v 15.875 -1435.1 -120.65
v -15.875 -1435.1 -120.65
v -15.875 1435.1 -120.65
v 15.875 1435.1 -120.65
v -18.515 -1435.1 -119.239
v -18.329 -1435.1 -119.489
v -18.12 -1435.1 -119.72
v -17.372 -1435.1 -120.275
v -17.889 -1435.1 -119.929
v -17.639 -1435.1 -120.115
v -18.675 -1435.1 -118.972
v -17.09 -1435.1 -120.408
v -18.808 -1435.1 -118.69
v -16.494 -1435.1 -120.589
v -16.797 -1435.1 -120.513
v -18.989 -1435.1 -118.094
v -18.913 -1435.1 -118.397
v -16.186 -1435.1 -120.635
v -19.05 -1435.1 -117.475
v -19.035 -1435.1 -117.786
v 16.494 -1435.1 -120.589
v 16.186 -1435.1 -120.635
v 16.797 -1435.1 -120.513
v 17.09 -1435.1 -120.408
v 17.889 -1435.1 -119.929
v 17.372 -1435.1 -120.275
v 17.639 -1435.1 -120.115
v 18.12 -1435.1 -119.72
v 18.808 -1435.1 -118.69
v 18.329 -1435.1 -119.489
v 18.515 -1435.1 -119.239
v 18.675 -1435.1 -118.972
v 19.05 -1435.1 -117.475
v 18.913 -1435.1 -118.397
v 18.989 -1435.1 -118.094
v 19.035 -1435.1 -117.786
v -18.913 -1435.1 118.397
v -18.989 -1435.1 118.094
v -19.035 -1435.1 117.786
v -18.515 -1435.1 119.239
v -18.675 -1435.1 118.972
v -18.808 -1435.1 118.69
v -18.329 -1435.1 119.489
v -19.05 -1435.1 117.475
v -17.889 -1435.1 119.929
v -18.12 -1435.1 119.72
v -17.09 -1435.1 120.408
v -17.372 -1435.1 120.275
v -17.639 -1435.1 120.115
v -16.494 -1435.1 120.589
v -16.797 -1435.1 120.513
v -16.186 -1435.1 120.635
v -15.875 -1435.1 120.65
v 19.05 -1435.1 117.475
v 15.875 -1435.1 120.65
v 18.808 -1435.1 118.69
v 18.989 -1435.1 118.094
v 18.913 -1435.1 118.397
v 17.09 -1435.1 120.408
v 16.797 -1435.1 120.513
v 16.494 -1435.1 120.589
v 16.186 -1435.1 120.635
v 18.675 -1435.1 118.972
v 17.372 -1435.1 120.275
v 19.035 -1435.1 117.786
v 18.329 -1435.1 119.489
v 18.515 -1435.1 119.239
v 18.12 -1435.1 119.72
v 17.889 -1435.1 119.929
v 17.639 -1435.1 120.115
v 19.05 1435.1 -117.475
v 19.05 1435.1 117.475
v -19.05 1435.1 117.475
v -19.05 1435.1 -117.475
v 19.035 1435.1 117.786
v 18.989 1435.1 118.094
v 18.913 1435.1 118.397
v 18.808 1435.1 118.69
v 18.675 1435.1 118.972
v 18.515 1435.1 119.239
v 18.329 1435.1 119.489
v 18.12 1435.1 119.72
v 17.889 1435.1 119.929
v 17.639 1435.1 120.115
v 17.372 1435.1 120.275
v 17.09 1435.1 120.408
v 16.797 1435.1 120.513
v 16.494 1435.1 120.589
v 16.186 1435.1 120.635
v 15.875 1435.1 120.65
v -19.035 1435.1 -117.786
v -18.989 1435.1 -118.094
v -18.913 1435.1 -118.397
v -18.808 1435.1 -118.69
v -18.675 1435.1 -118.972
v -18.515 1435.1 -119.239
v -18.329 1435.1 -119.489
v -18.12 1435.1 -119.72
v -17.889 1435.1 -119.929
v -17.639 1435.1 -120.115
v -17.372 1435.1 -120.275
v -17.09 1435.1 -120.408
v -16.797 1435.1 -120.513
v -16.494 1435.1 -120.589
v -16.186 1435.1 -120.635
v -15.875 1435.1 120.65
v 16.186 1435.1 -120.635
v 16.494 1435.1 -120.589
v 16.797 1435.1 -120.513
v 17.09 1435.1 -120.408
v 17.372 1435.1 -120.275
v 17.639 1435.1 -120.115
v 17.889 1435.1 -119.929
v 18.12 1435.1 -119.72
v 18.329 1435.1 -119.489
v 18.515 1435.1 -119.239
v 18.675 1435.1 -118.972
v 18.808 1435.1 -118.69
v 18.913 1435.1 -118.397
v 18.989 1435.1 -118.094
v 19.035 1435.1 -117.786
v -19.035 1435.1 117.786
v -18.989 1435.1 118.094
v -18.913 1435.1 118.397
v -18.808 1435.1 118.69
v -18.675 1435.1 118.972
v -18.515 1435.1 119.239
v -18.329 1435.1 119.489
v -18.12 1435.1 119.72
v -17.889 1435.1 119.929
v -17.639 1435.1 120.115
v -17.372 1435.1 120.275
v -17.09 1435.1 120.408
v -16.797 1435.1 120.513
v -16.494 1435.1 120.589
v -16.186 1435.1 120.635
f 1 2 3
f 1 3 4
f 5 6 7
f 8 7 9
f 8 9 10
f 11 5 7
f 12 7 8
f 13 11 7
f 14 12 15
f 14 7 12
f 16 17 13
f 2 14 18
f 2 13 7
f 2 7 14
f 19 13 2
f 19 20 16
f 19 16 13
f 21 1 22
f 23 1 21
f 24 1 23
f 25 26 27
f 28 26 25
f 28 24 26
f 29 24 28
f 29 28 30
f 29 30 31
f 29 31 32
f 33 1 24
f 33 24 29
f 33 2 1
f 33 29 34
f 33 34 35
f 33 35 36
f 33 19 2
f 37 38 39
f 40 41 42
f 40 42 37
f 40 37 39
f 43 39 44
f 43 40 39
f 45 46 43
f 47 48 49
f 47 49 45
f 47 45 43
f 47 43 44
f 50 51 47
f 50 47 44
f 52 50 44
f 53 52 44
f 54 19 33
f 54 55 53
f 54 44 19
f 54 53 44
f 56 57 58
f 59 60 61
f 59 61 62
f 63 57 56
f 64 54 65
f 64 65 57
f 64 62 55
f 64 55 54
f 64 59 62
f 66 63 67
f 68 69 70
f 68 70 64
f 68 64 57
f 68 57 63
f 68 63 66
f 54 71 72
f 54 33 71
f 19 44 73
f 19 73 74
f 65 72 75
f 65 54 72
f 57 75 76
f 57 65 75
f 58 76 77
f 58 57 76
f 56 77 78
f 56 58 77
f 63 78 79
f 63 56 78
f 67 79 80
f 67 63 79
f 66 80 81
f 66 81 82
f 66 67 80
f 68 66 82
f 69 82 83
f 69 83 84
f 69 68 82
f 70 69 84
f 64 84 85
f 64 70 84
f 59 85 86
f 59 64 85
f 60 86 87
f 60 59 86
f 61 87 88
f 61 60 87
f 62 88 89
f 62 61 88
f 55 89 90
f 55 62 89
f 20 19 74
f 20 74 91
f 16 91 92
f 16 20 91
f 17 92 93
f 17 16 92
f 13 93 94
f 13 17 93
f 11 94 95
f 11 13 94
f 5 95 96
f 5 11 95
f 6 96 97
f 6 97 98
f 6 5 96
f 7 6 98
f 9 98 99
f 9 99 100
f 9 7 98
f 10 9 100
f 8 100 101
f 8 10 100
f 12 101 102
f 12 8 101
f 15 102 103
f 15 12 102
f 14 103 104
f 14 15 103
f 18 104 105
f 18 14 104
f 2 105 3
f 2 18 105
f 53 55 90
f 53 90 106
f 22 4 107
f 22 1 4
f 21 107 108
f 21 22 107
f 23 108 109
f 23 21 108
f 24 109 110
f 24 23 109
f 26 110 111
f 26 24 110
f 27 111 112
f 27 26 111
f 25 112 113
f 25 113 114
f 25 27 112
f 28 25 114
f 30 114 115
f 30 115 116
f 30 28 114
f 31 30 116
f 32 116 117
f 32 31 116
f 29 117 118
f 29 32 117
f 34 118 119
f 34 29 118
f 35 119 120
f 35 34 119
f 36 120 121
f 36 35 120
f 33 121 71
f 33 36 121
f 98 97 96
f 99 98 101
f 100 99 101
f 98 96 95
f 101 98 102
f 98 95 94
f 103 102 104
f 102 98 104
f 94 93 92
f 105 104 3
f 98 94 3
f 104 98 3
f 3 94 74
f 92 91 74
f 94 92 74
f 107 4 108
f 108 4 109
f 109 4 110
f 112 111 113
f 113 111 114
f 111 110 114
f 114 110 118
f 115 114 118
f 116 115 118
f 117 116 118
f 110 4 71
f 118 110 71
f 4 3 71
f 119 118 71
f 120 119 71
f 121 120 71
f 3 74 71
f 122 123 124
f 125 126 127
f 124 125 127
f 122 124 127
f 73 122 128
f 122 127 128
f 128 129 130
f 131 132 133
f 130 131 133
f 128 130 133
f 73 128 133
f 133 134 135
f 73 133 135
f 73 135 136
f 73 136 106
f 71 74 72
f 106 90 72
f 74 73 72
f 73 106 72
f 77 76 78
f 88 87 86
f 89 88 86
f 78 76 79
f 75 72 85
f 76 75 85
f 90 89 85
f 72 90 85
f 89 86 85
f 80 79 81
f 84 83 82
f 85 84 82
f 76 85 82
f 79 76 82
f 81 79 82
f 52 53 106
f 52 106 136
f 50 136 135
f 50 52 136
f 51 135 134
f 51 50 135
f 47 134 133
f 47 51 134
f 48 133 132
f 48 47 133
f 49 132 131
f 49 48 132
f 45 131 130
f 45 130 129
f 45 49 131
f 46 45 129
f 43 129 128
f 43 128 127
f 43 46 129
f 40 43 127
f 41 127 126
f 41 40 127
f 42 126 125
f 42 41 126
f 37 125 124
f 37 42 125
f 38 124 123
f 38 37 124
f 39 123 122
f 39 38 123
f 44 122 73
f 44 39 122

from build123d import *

# Parameters (mm, degrees)
F1_DEPTH = 1435.1


with BuildPart() as f1:
    # F0 (on Front) → F1 (new body, symmetric)
    with BuildSketch(Plane.XZ):
        with BuildLine():
            ThreePointArc((19.05, 117.475), (18.120064, 119.720064), (15.875, 120.65))
            Line((15.875, 120.65), (-15.875, 120.65))
            ThreePointArc((-15.875, 120.65), (-18.120064, 119.720064), (-19.05, 117.475))
            Line((-19.05, 117.475), (-19.05, -117.475))
            ThreePointArc((-19.05, -117.475), (-18.120064, -119.720064), (-15.875, -120.65))
            Line((-15.875, -120.65), (15.875, -120.65))
            ThreePointArc((15.875, -120.65), (18.120064, -119.720064), (19.05, -117.475))
            Line((19.05, -117.475), (19.05, 117.475))
        make_face()
    extrude(amount=F1_DEPTH, both=True)


solid = f1.part
